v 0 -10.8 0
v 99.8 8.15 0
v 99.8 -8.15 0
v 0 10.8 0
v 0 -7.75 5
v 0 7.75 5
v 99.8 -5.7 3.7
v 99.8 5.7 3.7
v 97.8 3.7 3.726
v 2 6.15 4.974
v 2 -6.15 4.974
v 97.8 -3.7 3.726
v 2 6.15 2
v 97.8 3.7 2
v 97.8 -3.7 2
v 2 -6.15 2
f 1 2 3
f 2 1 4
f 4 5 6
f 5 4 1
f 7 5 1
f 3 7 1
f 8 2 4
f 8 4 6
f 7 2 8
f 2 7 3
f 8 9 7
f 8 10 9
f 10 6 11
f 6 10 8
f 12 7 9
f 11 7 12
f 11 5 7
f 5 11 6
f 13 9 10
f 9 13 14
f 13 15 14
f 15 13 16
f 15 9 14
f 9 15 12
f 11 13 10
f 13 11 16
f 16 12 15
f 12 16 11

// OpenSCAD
// file: noyau_utils.scad
// Same as mirror() but duplicates the children as opposed to just moving them.
module mirrored(v) {
  union() {
    children();
    mirror(v = v)
      children();
  } 
}

// Build a negative rounded corner to soften a square angle. Extra adds more
// material behind the rounded corner, which is sometimes useful to remove
// stuff.
module rounded_edge(radius, height, extra = 0) {
  translate([radius / 2, radius / 2, 0])
    difference() {
      translate([-extra/2, -extra/2, 0])
      cube([radius + .01 + extra, radius + .01 + extra, height + .01], center = true);
      translate([radius / 2, radius /2, 0])
        cylinder(r = radius, h = height + .02, center = true);
    }
}

// Build a cube with the corners in the z plane softened.
module rounded_cube(v, radius) {
  difference() {
    cube(v, center=true);
    mirrored([0, 1, 0]) mirrored([1, 0, 0])
      translate([-v[0]/2,-v[1]/2,0])
        rounded_edge(radius, v[2]);
  }
}

function number_of_circle_fragments(r) =
  $fn>0 ? ($fn >= 3 ? $fn : 3)
        : ceil(max(min(360 / $fa,
                       r * 2 * PI / $fs),
                   5));

// Build a cylinder garanteed to fit and element of the given radius. Aka, a
// little bit larger than a regular cylinder. Very useful with small fn.
module cylinder_outer(height,radius) {
  fn = number_of_circle_fragments(radius);
  fudge = 1 / cos(180 / fn);
  cylinder(h = height, r = radius * fudge, center = true);
}

// examples
translate([20, 20, 0]) rounded_edge(10, 5, 3);
translate([-20, 20, 0]) rounded_cube([20,15,5], 5);
mirrored([1, 0, 0]) translate([-20, -20, 0])difference() {
  cylinder_outer(5, 12, $fn = 6);
  cylinder(h = 6, r = 12, center = true);
}
// main file
// A replacement for the plastic cover on the bar right below the windshield on
// a KTM 790 Adventure..

use <noyau_utils.scad>;

bottom_width = 16.30;
bottom_width_inside = 11.40;
top_width = 21.60;
top_width_inside = 15.5;

length = 99.80;

bottom_height = 3.70;
top_height = 5;

body_points = [
 [0, top_width/2, 0],  // 0 Top tribord
 [0, -top_width/2, 0], // 1 top babord
 [length, -bottom_width/2, 0], // 2 bottom babord
 [length, bottom_width/2, 0], // 3 bottom tribord

 [0, top_width_inside/2, top_height],  // 4 Top inside tribord
 [0, -top_width_inside/2, top_height], // 5 top babord
 [length, -bottom_width_inside/2, bottom_height], // 6 bottom babord
 [length, bottom_width_inside/2, bottom_height], // 7 bottom tribord
];

module body() {
  polyhedron( points = body_points, faces = [
    [0,1,2,3], // front face
    [4,5,1,0], // top face
    [5,6,2,1], // babord
    [0,3,7,4], // tribord
    [6,7,3,2], // bottom
    [7,6,5,4], // back face
  ]);
}


module deep_body() {
  difference() {
    body();

    translate([0,0,2]) linear_extrude(5) #polygon([
      [2, -bottom_width/2 + 2], 
      [2, bottom_width/2 - 2], 
      [length-2, bottom_width_inside/2 - 2 ], 
      [length-2, -bottom_width_inside/2 + 2]
    ]);
  }
}

deep_body();
